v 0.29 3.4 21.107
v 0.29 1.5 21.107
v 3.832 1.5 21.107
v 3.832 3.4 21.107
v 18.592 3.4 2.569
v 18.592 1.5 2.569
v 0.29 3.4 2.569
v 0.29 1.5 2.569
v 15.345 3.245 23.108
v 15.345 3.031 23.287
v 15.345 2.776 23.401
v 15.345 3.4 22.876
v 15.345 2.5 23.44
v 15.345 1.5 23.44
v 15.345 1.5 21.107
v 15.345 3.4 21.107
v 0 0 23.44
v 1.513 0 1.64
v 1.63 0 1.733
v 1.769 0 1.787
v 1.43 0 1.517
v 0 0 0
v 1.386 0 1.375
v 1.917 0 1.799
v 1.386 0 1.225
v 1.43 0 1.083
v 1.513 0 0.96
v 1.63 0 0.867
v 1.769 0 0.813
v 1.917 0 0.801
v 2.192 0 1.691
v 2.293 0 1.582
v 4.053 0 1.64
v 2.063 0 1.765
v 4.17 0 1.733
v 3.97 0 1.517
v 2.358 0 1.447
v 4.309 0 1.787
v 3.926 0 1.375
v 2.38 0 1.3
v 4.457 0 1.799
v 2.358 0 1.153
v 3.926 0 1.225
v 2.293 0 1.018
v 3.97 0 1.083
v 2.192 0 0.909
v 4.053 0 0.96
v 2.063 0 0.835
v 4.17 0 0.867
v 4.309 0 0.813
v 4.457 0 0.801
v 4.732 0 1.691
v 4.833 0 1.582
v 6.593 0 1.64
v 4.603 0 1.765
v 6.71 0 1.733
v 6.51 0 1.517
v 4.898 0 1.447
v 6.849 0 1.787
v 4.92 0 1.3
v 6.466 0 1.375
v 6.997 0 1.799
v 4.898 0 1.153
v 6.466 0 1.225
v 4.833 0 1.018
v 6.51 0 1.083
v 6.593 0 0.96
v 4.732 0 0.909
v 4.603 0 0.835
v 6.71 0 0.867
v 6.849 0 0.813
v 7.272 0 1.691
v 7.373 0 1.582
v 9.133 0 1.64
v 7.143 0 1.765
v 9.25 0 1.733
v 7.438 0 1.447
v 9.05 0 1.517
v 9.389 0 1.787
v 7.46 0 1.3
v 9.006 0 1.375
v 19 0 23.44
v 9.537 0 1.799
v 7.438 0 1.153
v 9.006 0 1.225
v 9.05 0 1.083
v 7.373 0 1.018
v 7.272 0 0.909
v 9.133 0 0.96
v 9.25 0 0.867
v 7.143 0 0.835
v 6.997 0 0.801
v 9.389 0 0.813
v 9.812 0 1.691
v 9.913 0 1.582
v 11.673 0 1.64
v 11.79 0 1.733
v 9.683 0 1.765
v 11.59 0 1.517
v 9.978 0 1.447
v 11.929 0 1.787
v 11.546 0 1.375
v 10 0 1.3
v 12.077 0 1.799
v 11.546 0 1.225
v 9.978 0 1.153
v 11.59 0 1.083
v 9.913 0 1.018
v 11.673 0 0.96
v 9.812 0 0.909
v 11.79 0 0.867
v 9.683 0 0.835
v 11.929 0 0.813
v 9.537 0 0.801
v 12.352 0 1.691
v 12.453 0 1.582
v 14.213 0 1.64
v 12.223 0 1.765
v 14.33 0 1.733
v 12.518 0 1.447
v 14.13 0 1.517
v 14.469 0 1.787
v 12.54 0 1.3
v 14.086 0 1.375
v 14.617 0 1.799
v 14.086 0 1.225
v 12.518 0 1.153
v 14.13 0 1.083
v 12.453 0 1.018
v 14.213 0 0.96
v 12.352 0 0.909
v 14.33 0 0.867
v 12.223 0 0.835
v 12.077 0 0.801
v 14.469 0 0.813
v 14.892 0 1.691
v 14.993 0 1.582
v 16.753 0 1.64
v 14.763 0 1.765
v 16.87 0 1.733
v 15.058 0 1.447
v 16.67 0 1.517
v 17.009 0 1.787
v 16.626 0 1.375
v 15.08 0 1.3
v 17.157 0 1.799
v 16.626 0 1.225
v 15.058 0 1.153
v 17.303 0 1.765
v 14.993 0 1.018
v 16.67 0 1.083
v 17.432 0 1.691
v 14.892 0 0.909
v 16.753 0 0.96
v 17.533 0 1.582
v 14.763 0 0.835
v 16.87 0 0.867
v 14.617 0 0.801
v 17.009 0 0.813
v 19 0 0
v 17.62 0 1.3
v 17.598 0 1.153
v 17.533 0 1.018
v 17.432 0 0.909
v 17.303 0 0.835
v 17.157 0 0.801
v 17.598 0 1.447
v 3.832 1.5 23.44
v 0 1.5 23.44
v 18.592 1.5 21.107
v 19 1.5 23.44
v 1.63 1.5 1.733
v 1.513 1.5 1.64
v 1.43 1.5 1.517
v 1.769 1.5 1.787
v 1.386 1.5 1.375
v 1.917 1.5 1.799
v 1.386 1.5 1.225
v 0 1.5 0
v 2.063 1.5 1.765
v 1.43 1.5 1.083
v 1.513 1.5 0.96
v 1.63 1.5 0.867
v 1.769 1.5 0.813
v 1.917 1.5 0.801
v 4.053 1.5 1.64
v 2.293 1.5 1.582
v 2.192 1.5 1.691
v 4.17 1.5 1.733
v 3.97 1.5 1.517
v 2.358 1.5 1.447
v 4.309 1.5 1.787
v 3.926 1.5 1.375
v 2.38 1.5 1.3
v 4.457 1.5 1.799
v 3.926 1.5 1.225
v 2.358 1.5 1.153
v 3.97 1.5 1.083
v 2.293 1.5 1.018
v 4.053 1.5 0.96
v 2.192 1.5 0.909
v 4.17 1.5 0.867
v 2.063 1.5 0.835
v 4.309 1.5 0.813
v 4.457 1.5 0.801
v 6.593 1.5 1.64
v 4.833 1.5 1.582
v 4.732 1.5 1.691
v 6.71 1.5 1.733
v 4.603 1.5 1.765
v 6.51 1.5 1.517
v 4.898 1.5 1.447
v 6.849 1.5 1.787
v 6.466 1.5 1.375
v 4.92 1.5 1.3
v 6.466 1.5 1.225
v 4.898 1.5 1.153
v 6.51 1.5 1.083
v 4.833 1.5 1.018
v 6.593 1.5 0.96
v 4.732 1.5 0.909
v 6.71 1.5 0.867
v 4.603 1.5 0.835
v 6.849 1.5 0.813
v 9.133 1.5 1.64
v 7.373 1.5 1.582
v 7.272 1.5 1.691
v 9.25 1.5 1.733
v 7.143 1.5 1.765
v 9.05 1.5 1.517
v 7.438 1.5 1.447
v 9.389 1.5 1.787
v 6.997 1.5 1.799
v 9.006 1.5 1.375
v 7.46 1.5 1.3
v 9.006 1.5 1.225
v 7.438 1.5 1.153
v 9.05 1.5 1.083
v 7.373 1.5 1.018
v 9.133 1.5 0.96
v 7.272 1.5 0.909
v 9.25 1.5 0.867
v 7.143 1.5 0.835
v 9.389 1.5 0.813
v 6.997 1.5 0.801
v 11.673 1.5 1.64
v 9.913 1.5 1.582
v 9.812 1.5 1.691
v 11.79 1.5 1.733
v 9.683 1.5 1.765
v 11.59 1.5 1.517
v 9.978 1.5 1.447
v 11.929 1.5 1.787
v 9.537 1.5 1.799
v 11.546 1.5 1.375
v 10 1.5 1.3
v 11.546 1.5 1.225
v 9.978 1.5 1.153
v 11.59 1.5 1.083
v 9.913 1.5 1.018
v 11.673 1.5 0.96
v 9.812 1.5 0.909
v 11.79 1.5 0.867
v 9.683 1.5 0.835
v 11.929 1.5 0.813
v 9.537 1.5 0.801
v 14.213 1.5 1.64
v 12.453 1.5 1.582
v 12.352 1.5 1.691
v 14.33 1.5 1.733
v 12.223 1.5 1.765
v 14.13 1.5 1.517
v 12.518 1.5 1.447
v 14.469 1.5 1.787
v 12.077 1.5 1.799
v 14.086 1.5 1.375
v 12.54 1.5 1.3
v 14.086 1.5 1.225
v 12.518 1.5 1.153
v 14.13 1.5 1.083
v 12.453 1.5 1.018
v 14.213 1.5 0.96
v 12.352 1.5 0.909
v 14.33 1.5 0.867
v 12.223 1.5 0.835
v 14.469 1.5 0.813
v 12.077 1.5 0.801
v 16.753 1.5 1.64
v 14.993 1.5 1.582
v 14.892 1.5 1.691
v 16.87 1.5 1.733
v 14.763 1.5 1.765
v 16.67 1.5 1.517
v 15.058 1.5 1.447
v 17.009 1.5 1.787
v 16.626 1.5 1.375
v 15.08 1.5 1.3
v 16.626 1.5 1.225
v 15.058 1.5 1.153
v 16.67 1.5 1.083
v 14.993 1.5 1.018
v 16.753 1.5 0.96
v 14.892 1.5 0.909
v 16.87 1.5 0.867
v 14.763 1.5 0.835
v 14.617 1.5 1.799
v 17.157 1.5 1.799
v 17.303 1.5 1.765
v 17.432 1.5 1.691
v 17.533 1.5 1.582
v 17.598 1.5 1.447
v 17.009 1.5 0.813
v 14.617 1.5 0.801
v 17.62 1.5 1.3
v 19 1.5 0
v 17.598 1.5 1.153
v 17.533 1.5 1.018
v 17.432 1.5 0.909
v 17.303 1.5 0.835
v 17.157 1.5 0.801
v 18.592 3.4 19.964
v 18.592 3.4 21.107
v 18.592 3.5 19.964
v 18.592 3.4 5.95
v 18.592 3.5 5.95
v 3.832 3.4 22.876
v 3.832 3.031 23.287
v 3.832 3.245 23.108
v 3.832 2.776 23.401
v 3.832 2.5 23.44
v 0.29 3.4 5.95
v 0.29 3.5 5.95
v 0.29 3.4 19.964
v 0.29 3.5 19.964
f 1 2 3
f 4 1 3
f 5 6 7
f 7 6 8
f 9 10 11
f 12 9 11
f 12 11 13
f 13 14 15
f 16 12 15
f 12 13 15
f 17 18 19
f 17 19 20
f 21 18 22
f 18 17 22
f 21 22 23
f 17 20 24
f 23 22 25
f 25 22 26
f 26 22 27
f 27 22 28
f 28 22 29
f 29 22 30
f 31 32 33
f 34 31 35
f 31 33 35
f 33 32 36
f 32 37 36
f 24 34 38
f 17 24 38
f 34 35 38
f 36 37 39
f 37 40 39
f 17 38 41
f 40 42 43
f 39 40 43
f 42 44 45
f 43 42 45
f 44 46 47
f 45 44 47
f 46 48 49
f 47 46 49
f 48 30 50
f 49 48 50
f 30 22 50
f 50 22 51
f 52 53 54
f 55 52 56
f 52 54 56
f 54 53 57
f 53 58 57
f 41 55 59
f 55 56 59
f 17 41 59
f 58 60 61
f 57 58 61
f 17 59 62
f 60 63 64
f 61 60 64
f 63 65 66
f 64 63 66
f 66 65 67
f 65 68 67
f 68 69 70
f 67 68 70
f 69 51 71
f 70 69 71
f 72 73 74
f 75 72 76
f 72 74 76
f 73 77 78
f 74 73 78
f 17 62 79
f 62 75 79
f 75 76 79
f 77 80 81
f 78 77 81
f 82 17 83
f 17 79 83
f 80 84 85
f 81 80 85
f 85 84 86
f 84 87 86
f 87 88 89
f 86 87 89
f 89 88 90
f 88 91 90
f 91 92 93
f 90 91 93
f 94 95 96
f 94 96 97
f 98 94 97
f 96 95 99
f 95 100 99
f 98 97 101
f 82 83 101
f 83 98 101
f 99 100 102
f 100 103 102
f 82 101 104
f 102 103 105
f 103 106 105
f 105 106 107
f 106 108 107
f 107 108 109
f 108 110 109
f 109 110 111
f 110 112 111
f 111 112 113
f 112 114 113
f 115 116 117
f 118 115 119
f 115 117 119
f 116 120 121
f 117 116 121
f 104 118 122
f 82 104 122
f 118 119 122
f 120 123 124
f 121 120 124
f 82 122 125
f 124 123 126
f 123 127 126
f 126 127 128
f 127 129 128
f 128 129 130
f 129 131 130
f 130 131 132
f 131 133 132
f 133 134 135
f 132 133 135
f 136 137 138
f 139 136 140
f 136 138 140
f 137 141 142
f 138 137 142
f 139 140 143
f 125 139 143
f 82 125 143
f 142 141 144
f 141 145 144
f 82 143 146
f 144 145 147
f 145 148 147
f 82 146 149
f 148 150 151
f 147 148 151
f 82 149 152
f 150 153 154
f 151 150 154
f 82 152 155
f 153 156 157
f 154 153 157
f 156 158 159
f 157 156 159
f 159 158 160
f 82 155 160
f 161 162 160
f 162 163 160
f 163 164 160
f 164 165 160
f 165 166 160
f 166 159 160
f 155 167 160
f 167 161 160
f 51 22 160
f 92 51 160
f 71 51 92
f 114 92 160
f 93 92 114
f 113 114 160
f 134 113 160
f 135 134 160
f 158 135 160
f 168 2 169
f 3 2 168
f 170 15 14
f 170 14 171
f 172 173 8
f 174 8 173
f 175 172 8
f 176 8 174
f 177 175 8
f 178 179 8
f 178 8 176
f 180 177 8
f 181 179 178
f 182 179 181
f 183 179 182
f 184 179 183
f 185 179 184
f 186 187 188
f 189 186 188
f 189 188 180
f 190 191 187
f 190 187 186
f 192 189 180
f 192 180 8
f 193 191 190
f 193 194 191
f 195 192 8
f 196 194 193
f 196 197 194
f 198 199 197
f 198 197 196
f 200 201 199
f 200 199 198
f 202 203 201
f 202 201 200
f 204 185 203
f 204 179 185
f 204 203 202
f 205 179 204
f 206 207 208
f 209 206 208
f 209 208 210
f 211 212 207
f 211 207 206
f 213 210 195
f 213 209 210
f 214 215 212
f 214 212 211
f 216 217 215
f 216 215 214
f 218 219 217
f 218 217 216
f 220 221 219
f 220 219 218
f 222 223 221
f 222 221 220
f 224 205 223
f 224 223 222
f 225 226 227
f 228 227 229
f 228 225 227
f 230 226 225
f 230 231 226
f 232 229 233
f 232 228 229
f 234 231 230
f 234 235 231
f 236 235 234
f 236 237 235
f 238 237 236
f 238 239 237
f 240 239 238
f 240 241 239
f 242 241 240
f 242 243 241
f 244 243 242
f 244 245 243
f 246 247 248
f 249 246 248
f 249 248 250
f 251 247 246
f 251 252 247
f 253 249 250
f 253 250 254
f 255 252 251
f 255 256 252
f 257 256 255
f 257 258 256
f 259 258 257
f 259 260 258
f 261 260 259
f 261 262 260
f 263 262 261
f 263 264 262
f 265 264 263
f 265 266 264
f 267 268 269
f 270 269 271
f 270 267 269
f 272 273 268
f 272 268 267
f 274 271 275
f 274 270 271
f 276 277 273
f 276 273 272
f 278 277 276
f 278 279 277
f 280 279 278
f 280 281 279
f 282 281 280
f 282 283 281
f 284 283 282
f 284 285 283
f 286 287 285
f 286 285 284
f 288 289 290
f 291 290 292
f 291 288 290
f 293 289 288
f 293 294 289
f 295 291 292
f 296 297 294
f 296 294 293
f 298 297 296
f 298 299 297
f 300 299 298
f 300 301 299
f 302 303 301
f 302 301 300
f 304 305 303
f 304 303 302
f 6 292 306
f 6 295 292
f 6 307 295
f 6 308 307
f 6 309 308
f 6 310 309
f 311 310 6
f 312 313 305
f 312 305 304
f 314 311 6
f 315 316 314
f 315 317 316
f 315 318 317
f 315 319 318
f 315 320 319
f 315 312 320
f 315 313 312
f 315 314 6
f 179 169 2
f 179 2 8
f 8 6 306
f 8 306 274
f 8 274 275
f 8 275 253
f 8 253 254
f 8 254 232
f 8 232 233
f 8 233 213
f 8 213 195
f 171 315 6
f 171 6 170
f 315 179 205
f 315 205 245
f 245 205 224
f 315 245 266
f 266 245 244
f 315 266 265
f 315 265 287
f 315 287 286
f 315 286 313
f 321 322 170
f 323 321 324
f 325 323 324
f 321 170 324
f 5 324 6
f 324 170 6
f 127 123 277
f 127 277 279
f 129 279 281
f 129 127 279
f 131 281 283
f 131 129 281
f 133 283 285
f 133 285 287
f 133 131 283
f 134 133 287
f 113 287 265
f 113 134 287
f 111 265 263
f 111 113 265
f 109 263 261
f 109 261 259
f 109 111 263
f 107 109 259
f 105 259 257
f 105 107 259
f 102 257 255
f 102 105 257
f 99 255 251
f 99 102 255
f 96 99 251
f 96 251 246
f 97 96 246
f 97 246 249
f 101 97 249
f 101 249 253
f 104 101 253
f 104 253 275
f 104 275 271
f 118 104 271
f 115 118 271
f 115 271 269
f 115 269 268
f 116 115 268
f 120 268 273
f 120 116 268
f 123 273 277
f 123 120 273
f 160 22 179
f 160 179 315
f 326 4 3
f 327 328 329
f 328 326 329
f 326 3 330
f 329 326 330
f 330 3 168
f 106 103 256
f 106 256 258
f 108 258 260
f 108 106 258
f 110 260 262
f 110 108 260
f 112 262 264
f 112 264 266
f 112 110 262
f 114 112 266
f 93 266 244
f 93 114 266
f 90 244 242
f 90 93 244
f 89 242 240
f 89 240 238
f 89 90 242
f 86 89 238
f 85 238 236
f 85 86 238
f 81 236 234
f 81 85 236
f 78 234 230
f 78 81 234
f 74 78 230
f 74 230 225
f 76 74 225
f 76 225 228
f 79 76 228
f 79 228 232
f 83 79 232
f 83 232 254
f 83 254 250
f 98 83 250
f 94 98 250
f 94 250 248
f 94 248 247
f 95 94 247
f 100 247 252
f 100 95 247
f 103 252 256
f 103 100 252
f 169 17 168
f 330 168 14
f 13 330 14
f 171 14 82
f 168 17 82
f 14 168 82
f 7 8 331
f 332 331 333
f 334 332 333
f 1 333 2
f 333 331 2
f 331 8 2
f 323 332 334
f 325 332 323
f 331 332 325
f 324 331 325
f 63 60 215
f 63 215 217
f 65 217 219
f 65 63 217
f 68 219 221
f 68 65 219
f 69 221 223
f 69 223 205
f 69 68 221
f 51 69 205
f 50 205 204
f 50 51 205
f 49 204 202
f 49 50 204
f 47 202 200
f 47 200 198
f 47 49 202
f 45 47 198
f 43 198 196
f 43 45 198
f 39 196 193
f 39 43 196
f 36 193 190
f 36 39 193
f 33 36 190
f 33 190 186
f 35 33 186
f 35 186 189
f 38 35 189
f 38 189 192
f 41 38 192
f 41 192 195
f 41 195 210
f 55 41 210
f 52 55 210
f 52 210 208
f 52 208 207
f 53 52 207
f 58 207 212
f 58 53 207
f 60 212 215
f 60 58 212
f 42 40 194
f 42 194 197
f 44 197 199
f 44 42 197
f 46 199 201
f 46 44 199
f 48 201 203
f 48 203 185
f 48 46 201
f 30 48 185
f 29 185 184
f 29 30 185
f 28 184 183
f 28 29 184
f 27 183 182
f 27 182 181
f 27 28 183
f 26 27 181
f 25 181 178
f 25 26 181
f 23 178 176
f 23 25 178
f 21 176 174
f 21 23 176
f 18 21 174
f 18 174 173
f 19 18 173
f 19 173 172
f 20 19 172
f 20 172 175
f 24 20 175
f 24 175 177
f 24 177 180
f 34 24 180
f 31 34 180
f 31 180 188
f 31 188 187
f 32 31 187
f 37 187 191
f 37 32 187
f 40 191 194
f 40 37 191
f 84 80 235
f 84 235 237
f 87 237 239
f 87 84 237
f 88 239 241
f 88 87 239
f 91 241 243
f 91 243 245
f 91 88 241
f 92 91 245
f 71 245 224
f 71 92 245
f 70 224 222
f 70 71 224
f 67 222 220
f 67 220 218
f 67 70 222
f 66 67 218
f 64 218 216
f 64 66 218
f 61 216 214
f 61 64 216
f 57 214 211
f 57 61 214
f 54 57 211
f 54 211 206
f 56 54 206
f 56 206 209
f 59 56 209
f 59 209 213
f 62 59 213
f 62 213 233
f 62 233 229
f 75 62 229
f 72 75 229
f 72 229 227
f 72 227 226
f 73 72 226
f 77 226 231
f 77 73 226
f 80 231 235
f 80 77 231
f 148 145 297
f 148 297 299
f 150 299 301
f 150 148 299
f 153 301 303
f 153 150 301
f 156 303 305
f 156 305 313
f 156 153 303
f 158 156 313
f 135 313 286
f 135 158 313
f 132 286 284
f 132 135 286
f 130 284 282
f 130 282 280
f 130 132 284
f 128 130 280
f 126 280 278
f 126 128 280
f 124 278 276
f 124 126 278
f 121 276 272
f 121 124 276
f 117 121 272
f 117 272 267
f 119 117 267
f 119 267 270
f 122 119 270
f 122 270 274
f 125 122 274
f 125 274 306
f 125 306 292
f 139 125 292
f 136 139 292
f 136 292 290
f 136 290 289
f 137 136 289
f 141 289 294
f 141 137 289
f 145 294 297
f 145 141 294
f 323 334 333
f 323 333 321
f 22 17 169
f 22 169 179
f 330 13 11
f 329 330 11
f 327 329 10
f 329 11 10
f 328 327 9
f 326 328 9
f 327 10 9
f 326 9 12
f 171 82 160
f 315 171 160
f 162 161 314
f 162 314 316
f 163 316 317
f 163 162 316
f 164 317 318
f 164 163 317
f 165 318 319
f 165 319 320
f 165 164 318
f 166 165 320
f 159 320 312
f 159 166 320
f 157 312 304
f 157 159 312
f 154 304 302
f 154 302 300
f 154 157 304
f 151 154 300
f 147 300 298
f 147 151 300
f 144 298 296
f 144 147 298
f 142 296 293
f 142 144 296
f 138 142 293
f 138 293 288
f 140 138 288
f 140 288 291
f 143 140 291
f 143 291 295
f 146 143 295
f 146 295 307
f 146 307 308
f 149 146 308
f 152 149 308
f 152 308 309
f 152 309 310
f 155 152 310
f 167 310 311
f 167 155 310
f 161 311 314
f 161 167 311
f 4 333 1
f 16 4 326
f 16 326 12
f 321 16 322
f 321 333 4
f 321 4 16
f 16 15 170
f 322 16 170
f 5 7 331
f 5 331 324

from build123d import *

# Parameters (mm, degrees)
SKETCH1_W           = 19
SKETCH1_H           = 23.44
SKETCH1_R           = 0.5
BOSS_EXTRUDE1_DEPTH = 1.5
BOSS_EXTRUDE2_DEPTH = 2
FILLET1_R           = 1
SKETCH4_W           = 18.301670477
SKETCH4_H           = 3.380629264
SKETCH4_H_2         = 3.475508354
CUT_EXTRUDE1_DEPTH  = 0.1


with BuildPart() as part:
    # Sketch1 → Boss-Extrude1 (new body)
    with BuildSketch(Plane(origin=(0, 0, 0), x_dir=(1, 0, 0), z_dir=(0, 1, 0))):
        with Locations((9.5, -11.72)):
            Rectangle(SKETCH1_W, SKETCH1_H)
        with Locations((1.88, -1.3)):
            Circle(SKETCH1_R, mode=Mode.SUBTRACT)
        with Locations((4.42, -1.3)):
            Circle(SKETCH1_R, mode=Mode.SUBTRACT)
        with Locations((6.96, -1.3)):
            Circle(SKETCH1_R, mode=Mode.SUBTRACT)
        with Locations((9.5, -1.3)):
            Circle(SKETCH1_R, mode=Mode.SUBTRACT)
        with Locations((12.04, -1.3)):
            Circle(SKETCH1_R, mode=Mode.SUBTRACT)
        with Locations((14.58, -1.3)):
            Circle(SKETCH1_R, mode=Mode.SUBTRACT)
        with Locations((17.12, -1.3)):
            Circle(SKETCH1_R, mode=Mode.SUBTRACT)
    extrude(amount=BOSS_EXTRUDE1_DEPTH)

    # Sketch3 → Boss-Extrude2 (add)
    with BuildSketch(Plane(origin=(0, 1.5, 0), x_dir=(1, 0, 0), z_dir=(0, 1, 0))):
        Polygon((3.832385917, -21.106985825), (3.832385917, -23.44), (15.344727023, -23.44), (15.344727023, -21.106985825), (18.591797592, -21.106985825), (18.591797592, -2.569164761), (0.290127115, -2.569164761), (0.290127115, -21.106985825), align=None)
    extrude(amount=BOSS_EXTRUDE2_DEPTH)

    # Fillet1
    fillet1_edges = [part.edges().sort_by_distance(p)[0] for p in [
        (9.58855647, 3.5, 23.44),
    ]]
    fillet(fillet1_edges, radius=FILLET1_R)

    # Sketch4 → Cut-Extrude1 (cut)
    with BuildSketch(Plane(origin=(0, 3.5, 0), x_dir=(1, 0, 0), z_dir=(0, 1, 0))):
        with Locations((9.440962354, -4.259479393)):
            Rectangle(SKETCH4_W, SKETCH4_H)
        with Locations((9.440962354, -21.702245823)):
            Rectangle(SKETCH4_W, SKETCH4_H_2)
    extrude(amount=-CUT_EXTRUDE1_DEPTH, mode=Mode.SUBTRACT)


solid = part.part
